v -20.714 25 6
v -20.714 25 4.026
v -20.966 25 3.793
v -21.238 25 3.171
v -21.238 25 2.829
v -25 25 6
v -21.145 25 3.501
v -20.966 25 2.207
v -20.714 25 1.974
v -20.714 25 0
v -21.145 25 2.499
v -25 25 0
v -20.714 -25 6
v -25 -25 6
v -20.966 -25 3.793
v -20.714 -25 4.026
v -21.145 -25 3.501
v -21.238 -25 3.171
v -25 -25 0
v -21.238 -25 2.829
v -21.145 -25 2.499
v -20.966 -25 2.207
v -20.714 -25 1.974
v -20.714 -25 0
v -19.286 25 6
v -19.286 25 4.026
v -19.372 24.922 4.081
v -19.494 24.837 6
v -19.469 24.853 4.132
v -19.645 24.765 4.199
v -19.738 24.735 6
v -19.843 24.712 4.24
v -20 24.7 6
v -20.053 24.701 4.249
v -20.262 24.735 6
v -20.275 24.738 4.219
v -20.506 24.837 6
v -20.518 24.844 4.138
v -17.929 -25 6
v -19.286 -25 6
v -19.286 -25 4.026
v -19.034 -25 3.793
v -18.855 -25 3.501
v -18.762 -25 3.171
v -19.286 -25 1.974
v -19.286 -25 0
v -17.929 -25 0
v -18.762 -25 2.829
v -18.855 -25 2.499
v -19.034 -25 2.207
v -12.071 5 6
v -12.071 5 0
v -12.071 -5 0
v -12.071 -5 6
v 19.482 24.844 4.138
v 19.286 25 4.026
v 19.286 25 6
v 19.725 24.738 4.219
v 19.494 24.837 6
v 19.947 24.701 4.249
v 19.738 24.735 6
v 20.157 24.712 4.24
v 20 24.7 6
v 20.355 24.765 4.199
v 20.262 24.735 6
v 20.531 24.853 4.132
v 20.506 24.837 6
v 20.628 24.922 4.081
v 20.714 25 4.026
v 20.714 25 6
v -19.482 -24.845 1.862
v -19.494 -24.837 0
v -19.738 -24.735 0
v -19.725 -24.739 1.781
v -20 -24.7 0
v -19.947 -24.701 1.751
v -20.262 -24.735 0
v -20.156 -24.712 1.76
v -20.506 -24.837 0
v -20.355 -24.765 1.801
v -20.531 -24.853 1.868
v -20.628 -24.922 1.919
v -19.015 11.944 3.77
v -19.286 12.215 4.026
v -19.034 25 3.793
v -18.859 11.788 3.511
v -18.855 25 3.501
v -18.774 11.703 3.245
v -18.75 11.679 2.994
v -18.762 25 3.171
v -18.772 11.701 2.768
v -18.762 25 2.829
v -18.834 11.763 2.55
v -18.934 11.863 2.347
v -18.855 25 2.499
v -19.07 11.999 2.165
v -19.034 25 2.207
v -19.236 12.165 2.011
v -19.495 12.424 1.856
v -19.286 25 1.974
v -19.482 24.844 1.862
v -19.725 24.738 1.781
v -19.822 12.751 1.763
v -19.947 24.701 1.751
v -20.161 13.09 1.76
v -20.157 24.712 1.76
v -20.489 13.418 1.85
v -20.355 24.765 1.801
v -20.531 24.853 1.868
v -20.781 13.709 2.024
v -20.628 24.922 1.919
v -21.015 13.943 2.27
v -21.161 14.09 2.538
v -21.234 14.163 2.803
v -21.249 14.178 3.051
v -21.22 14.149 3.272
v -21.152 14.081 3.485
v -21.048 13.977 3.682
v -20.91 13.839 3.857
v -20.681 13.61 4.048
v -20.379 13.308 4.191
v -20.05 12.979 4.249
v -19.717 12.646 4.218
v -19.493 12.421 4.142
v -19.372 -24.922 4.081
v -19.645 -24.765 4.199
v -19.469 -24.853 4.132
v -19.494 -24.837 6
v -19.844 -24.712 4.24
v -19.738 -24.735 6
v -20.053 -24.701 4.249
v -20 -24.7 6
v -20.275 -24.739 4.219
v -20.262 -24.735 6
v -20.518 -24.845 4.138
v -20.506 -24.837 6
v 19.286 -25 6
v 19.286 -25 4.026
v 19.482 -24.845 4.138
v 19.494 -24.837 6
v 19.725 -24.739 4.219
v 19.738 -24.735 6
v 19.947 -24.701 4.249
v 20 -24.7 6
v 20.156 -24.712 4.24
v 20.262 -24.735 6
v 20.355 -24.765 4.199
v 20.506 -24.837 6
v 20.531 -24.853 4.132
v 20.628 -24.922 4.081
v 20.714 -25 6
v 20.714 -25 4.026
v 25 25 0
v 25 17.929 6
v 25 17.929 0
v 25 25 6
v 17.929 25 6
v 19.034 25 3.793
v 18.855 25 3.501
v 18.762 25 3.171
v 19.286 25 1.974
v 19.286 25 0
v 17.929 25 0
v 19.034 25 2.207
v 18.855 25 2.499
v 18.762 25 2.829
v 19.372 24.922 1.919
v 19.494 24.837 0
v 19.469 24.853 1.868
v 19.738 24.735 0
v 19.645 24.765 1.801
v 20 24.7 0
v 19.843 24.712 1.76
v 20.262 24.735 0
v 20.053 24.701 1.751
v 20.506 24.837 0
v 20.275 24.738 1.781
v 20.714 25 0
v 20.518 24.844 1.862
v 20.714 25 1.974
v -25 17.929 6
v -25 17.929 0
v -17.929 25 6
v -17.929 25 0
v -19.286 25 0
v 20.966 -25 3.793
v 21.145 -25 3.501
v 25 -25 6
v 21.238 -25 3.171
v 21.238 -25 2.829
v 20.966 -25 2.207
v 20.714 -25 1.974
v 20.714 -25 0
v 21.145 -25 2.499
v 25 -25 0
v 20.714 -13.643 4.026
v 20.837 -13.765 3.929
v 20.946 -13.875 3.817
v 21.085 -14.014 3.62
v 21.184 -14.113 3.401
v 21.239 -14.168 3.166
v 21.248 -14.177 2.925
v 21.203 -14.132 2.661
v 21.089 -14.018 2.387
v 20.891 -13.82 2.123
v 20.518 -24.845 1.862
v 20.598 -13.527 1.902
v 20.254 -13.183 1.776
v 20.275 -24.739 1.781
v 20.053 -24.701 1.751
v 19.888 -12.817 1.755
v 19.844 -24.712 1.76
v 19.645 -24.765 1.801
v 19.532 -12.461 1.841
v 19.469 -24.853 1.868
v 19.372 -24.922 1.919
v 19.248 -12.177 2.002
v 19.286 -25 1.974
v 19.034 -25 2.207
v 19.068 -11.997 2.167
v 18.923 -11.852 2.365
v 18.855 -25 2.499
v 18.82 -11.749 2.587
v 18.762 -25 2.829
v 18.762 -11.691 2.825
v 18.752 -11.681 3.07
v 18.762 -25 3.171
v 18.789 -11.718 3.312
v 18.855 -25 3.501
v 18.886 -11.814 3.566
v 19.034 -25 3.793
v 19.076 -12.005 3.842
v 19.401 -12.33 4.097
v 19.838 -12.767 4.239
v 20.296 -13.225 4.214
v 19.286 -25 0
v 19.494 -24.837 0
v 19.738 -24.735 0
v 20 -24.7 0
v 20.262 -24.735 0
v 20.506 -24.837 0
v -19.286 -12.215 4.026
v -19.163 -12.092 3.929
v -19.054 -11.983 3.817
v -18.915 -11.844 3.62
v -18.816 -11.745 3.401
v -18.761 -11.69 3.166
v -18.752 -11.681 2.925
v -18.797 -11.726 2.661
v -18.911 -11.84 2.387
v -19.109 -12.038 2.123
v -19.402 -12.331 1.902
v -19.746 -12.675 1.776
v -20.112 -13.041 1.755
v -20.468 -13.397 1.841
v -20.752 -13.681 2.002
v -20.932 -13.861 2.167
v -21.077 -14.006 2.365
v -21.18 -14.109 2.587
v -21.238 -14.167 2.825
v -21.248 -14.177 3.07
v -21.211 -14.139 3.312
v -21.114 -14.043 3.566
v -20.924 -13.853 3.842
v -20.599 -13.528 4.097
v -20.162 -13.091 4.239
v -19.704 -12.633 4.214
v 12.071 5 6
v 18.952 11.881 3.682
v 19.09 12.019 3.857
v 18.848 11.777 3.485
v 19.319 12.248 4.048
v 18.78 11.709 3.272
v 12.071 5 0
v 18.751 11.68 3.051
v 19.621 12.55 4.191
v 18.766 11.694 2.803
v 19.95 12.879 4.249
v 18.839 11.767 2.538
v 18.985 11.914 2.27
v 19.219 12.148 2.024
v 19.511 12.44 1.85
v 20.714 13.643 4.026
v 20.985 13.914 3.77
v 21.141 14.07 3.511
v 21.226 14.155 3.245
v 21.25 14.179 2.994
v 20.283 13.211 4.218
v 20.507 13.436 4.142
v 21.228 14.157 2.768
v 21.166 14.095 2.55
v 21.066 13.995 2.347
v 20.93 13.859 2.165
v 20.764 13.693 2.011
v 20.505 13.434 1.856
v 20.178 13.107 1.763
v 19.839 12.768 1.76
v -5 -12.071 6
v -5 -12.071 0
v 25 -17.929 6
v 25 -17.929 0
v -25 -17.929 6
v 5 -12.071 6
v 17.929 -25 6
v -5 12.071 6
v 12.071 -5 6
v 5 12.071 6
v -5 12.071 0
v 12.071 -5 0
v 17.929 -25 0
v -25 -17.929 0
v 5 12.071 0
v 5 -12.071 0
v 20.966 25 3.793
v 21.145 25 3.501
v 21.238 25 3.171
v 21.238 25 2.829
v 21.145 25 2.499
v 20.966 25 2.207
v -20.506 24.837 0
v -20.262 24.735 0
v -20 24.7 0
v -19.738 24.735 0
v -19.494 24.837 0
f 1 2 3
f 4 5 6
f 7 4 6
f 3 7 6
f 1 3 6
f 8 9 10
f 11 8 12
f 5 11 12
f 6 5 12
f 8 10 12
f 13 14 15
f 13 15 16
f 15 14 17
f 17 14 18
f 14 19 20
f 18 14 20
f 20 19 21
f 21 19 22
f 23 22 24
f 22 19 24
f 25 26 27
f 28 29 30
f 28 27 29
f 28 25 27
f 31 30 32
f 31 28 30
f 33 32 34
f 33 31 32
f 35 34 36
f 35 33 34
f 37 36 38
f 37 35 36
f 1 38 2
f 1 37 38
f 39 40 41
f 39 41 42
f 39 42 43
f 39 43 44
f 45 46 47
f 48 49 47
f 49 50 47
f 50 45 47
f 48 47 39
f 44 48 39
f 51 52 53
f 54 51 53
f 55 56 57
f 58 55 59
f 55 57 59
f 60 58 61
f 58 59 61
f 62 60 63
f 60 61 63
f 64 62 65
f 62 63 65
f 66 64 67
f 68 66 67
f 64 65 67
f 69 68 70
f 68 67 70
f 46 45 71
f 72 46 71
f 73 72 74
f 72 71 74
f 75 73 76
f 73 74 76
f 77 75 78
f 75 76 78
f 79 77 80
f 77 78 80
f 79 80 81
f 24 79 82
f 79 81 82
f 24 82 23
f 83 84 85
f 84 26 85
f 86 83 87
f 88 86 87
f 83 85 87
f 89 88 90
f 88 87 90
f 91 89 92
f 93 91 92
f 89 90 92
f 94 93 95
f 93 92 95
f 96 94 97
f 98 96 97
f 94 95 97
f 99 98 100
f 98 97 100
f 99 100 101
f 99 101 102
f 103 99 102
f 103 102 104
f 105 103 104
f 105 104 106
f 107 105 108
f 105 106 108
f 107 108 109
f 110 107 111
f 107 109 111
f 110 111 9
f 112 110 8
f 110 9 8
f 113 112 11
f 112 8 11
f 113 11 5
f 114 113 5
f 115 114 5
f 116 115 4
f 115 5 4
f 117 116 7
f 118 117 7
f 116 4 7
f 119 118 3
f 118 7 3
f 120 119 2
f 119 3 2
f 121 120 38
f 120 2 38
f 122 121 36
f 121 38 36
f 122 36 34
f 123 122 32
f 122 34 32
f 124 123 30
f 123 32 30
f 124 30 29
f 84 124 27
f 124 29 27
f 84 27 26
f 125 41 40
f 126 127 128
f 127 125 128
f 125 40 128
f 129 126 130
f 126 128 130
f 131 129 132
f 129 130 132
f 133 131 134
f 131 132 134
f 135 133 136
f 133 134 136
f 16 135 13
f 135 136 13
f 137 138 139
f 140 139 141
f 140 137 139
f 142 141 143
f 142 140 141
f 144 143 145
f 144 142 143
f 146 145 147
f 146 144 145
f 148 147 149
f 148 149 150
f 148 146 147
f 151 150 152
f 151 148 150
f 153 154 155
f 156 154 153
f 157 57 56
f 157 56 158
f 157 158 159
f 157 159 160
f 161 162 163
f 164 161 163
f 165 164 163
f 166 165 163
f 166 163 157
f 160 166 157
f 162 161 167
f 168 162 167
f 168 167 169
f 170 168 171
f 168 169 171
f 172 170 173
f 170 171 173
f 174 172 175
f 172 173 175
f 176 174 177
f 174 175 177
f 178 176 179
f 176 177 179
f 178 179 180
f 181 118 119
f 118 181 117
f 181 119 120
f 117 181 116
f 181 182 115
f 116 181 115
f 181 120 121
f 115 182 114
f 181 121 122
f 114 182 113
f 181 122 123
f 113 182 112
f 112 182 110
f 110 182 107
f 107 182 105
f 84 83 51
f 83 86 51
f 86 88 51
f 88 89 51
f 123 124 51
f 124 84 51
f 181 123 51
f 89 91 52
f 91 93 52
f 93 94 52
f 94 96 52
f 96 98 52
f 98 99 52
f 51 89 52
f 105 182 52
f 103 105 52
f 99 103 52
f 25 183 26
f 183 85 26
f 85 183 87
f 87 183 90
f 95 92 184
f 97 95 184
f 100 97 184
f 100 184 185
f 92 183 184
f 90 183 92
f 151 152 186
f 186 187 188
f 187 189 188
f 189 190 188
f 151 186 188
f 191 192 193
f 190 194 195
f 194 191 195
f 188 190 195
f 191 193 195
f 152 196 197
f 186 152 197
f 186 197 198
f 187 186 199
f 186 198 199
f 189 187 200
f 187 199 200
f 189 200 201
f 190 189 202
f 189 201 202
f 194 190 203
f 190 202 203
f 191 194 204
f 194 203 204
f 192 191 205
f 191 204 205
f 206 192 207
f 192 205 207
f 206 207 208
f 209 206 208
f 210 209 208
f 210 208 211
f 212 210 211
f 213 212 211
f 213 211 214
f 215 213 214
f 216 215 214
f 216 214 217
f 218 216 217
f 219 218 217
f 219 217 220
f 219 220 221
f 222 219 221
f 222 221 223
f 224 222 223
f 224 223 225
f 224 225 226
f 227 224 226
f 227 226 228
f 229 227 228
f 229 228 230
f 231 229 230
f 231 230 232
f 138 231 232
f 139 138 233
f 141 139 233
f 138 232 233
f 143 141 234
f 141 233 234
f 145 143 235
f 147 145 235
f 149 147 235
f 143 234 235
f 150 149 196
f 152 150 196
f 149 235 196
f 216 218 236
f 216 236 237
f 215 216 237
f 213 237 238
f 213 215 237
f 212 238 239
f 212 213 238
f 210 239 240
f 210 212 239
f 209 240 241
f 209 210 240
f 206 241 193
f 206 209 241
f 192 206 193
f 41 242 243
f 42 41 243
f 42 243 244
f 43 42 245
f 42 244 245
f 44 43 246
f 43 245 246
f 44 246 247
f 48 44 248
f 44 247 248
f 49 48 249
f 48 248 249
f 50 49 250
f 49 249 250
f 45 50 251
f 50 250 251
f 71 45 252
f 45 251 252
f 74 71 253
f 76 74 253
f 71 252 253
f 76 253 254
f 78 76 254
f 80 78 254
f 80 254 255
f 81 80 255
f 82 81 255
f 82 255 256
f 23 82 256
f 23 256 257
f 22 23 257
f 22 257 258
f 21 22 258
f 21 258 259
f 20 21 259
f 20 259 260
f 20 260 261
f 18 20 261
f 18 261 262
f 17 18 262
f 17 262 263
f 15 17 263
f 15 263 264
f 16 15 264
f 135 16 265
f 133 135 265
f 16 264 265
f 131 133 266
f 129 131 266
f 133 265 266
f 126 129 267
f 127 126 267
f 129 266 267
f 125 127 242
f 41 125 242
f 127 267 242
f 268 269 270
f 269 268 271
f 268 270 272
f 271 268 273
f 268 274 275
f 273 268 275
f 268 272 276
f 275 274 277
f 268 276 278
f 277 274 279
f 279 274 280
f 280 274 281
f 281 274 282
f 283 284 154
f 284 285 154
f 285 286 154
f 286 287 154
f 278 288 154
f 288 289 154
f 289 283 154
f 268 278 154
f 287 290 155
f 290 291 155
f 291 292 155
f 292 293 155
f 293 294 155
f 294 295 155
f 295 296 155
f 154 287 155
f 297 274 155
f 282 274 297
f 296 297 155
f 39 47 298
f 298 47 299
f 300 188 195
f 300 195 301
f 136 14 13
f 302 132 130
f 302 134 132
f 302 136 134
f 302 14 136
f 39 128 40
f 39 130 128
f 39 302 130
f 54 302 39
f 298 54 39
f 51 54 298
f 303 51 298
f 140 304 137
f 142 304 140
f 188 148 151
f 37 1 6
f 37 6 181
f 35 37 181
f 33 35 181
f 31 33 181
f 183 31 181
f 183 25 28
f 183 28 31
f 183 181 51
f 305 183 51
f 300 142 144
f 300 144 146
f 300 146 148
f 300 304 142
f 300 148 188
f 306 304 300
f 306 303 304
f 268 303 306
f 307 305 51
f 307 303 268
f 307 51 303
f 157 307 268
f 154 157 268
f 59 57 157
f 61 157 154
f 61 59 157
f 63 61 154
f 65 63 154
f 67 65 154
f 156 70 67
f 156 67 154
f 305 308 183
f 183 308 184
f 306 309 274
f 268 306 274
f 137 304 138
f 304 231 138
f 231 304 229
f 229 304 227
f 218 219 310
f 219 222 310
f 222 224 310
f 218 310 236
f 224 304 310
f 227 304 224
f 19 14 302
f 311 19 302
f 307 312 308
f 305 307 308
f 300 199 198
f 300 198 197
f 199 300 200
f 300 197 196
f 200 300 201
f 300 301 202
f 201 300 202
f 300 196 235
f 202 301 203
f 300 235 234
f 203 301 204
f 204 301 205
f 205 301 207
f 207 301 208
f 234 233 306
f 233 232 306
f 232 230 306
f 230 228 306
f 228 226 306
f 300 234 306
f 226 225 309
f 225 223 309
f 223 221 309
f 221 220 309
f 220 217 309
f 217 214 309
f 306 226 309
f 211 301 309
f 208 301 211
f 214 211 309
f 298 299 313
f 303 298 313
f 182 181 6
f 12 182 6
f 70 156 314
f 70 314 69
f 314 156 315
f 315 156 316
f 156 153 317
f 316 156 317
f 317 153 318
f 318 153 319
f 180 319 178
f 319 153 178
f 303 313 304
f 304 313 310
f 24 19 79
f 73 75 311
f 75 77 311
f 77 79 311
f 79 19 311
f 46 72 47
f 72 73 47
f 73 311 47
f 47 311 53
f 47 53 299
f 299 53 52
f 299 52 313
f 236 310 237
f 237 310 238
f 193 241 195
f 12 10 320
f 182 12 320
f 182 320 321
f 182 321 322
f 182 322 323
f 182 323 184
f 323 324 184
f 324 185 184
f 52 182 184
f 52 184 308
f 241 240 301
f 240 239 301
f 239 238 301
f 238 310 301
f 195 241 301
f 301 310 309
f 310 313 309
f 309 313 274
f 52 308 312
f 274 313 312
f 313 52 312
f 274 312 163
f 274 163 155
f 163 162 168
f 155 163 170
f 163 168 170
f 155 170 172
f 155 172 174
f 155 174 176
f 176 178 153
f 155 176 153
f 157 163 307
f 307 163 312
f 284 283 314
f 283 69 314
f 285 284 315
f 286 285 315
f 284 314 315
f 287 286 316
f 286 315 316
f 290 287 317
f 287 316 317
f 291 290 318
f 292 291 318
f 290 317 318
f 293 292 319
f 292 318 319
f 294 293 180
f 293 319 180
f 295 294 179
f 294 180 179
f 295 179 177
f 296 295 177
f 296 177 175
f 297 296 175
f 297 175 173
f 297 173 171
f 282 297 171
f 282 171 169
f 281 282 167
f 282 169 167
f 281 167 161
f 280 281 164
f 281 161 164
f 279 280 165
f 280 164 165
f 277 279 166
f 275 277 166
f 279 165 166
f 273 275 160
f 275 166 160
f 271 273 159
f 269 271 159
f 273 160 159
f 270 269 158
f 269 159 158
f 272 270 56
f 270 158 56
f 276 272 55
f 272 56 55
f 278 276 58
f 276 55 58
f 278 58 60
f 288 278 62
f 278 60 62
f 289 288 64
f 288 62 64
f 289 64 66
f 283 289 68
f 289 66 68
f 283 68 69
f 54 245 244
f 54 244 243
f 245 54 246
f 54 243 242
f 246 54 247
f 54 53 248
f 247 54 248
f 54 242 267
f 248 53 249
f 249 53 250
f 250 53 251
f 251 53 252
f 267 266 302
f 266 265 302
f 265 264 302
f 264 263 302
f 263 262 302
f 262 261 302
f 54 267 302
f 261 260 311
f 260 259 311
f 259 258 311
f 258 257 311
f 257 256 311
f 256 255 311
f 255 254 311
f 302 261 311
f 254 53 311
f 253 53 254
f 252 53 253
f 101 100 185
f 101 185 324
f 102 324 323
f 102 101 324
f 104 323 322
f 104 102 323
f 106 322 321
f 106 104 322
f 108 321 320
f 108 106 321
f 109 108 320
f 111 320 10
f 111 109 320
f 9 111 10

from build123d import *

# Parameters (mm, degrees)
EXTRUDE_1_DEPTH        = 6
CUT_EXTRUDE_1_DEPTH    = 42.104177289
FILLET_1_R             = 2
FILLET_1_OF_MIRROR_3_R = 2
SKETCH_3_R             = 1.25
CUT_EXTRUDE_2_DEPTH    = 59.233427122
SKETCH_4_W             = 4.242640687
SKETCH_4_H             = 50
CUT_EXTRUDE_3_DEPTH    = 39.937540248


with BuildPart() as part:
    # ｽｹｯﾁ1 → ﾎﾞｽ - 押し出し1 (new body)
    with BuildSketch(Plane.XY):
        Polygon((-32.071067812, 25), (-12.071067812, 5), (-12.071067812, -5), (-32.071067812, -25), (-17.928932188, -25), (-5, -12.071067812), (5, -12.071067812), (17.928932188, -25), (32.071067812, -25), (12.071067812, -5), (12.071067812, 5), (32.071067812, 25), (17.928932188, 25), (5, 12.071067812), (-5, 12.071067812), (-17.928932188, 25), align=None)
    extrude(amount=EXTRUDE_1_DEPTH)

    # ｽｹｯﾁ2 → ｶｯﾄ - 押し出し1 (cut, through all)
    with BuildSketch(Plane.XY.offset(6)):
        with BuildLine():
            Line((-20.714142843, 25), (-19.285857157, 25))
            ThreePointArc((-19.285857157, 25), (-20, 24.7), (-20.714142843, 25))
        make_face()
        with BuildLine():
            Line((20.714142843, 25), (19.285857157, 25))
            ThreePointArc((19.285857157, 25), (20, 24.7), (20.714142843, 25))
        make_face()
    cut_extrude_1 = extrude(amount=-CUT_EXTRUDE_1_DEPTH, mode=Mode.SUBTRACT)

    # ﾌｨﾚｯﾄ1
    fillet_1_edges = [part.edges().sort_by_distance(p)[0] for p in [
        (32.071067812, 25, 3),
        (-32.071067812, 25, 3),
    ]]
    fillet(fillet_1_edges, radius=FILLET_1_R)

    # ﾐﾗｰ3: ｶｯﾄ - 押し出し1 across plane
    add(cut_extrude_1.mirror(Plane.ZX), mode=Mode.SUBTRACT)

    # ﾌｨﾚｯﾄ1 of ﾐﾗｰ3
    fillet_1_of_mirror_3_edges = [part.edges().sort_by_distance(p)[0] for p in [
        (32.071067812, -25, 3),
        (-32.071067812, -25, 3),
    ]]
    fillet(fillet_1_of_mirror_3_edges, radius=FILLET_1_OF_MIRROR_3_R)

    # ｽｹｯﾁ3 → ｶｯﾄ - 押し出し2 (cut, through all)
    with BuildSketch(Plane(origin=(0, 25, 0), x_dir=(1, 0, 0), z_dir=(0, 1, 0))):
        with Locations(Location((-20, -3, 0), (0, 0, 304.841925036))):
            Circle(SKETCH_3_R)
        with Locations(Location((20, -3, 0), (0, 0, 304.841925036))):
            Circle(SKETCH_3_R)
    extrude(amount=-CUT_EXTRUDE_2_DEPTH, mode=Mode.SUBTRACT)

    # ｽｹｯﾁ4 → ｶｯﾄ - 押し出し3 (cut, through all)
    with BuildSketch(Plane.XY.offset(6)):
        with Locations((-27.121320344, 0)):
            Rectangle(SKETCH_4_W, SKETCH_4_H)
        with Locations((27.121320344, 0)):
            Rectangle(SKETCH_4_W, SKETCH_4_H)
    extrude(amount=-CUT_EXTRUDE_3_DEPTH, mode=Mode.SUBTRACT)


solid = part.part
